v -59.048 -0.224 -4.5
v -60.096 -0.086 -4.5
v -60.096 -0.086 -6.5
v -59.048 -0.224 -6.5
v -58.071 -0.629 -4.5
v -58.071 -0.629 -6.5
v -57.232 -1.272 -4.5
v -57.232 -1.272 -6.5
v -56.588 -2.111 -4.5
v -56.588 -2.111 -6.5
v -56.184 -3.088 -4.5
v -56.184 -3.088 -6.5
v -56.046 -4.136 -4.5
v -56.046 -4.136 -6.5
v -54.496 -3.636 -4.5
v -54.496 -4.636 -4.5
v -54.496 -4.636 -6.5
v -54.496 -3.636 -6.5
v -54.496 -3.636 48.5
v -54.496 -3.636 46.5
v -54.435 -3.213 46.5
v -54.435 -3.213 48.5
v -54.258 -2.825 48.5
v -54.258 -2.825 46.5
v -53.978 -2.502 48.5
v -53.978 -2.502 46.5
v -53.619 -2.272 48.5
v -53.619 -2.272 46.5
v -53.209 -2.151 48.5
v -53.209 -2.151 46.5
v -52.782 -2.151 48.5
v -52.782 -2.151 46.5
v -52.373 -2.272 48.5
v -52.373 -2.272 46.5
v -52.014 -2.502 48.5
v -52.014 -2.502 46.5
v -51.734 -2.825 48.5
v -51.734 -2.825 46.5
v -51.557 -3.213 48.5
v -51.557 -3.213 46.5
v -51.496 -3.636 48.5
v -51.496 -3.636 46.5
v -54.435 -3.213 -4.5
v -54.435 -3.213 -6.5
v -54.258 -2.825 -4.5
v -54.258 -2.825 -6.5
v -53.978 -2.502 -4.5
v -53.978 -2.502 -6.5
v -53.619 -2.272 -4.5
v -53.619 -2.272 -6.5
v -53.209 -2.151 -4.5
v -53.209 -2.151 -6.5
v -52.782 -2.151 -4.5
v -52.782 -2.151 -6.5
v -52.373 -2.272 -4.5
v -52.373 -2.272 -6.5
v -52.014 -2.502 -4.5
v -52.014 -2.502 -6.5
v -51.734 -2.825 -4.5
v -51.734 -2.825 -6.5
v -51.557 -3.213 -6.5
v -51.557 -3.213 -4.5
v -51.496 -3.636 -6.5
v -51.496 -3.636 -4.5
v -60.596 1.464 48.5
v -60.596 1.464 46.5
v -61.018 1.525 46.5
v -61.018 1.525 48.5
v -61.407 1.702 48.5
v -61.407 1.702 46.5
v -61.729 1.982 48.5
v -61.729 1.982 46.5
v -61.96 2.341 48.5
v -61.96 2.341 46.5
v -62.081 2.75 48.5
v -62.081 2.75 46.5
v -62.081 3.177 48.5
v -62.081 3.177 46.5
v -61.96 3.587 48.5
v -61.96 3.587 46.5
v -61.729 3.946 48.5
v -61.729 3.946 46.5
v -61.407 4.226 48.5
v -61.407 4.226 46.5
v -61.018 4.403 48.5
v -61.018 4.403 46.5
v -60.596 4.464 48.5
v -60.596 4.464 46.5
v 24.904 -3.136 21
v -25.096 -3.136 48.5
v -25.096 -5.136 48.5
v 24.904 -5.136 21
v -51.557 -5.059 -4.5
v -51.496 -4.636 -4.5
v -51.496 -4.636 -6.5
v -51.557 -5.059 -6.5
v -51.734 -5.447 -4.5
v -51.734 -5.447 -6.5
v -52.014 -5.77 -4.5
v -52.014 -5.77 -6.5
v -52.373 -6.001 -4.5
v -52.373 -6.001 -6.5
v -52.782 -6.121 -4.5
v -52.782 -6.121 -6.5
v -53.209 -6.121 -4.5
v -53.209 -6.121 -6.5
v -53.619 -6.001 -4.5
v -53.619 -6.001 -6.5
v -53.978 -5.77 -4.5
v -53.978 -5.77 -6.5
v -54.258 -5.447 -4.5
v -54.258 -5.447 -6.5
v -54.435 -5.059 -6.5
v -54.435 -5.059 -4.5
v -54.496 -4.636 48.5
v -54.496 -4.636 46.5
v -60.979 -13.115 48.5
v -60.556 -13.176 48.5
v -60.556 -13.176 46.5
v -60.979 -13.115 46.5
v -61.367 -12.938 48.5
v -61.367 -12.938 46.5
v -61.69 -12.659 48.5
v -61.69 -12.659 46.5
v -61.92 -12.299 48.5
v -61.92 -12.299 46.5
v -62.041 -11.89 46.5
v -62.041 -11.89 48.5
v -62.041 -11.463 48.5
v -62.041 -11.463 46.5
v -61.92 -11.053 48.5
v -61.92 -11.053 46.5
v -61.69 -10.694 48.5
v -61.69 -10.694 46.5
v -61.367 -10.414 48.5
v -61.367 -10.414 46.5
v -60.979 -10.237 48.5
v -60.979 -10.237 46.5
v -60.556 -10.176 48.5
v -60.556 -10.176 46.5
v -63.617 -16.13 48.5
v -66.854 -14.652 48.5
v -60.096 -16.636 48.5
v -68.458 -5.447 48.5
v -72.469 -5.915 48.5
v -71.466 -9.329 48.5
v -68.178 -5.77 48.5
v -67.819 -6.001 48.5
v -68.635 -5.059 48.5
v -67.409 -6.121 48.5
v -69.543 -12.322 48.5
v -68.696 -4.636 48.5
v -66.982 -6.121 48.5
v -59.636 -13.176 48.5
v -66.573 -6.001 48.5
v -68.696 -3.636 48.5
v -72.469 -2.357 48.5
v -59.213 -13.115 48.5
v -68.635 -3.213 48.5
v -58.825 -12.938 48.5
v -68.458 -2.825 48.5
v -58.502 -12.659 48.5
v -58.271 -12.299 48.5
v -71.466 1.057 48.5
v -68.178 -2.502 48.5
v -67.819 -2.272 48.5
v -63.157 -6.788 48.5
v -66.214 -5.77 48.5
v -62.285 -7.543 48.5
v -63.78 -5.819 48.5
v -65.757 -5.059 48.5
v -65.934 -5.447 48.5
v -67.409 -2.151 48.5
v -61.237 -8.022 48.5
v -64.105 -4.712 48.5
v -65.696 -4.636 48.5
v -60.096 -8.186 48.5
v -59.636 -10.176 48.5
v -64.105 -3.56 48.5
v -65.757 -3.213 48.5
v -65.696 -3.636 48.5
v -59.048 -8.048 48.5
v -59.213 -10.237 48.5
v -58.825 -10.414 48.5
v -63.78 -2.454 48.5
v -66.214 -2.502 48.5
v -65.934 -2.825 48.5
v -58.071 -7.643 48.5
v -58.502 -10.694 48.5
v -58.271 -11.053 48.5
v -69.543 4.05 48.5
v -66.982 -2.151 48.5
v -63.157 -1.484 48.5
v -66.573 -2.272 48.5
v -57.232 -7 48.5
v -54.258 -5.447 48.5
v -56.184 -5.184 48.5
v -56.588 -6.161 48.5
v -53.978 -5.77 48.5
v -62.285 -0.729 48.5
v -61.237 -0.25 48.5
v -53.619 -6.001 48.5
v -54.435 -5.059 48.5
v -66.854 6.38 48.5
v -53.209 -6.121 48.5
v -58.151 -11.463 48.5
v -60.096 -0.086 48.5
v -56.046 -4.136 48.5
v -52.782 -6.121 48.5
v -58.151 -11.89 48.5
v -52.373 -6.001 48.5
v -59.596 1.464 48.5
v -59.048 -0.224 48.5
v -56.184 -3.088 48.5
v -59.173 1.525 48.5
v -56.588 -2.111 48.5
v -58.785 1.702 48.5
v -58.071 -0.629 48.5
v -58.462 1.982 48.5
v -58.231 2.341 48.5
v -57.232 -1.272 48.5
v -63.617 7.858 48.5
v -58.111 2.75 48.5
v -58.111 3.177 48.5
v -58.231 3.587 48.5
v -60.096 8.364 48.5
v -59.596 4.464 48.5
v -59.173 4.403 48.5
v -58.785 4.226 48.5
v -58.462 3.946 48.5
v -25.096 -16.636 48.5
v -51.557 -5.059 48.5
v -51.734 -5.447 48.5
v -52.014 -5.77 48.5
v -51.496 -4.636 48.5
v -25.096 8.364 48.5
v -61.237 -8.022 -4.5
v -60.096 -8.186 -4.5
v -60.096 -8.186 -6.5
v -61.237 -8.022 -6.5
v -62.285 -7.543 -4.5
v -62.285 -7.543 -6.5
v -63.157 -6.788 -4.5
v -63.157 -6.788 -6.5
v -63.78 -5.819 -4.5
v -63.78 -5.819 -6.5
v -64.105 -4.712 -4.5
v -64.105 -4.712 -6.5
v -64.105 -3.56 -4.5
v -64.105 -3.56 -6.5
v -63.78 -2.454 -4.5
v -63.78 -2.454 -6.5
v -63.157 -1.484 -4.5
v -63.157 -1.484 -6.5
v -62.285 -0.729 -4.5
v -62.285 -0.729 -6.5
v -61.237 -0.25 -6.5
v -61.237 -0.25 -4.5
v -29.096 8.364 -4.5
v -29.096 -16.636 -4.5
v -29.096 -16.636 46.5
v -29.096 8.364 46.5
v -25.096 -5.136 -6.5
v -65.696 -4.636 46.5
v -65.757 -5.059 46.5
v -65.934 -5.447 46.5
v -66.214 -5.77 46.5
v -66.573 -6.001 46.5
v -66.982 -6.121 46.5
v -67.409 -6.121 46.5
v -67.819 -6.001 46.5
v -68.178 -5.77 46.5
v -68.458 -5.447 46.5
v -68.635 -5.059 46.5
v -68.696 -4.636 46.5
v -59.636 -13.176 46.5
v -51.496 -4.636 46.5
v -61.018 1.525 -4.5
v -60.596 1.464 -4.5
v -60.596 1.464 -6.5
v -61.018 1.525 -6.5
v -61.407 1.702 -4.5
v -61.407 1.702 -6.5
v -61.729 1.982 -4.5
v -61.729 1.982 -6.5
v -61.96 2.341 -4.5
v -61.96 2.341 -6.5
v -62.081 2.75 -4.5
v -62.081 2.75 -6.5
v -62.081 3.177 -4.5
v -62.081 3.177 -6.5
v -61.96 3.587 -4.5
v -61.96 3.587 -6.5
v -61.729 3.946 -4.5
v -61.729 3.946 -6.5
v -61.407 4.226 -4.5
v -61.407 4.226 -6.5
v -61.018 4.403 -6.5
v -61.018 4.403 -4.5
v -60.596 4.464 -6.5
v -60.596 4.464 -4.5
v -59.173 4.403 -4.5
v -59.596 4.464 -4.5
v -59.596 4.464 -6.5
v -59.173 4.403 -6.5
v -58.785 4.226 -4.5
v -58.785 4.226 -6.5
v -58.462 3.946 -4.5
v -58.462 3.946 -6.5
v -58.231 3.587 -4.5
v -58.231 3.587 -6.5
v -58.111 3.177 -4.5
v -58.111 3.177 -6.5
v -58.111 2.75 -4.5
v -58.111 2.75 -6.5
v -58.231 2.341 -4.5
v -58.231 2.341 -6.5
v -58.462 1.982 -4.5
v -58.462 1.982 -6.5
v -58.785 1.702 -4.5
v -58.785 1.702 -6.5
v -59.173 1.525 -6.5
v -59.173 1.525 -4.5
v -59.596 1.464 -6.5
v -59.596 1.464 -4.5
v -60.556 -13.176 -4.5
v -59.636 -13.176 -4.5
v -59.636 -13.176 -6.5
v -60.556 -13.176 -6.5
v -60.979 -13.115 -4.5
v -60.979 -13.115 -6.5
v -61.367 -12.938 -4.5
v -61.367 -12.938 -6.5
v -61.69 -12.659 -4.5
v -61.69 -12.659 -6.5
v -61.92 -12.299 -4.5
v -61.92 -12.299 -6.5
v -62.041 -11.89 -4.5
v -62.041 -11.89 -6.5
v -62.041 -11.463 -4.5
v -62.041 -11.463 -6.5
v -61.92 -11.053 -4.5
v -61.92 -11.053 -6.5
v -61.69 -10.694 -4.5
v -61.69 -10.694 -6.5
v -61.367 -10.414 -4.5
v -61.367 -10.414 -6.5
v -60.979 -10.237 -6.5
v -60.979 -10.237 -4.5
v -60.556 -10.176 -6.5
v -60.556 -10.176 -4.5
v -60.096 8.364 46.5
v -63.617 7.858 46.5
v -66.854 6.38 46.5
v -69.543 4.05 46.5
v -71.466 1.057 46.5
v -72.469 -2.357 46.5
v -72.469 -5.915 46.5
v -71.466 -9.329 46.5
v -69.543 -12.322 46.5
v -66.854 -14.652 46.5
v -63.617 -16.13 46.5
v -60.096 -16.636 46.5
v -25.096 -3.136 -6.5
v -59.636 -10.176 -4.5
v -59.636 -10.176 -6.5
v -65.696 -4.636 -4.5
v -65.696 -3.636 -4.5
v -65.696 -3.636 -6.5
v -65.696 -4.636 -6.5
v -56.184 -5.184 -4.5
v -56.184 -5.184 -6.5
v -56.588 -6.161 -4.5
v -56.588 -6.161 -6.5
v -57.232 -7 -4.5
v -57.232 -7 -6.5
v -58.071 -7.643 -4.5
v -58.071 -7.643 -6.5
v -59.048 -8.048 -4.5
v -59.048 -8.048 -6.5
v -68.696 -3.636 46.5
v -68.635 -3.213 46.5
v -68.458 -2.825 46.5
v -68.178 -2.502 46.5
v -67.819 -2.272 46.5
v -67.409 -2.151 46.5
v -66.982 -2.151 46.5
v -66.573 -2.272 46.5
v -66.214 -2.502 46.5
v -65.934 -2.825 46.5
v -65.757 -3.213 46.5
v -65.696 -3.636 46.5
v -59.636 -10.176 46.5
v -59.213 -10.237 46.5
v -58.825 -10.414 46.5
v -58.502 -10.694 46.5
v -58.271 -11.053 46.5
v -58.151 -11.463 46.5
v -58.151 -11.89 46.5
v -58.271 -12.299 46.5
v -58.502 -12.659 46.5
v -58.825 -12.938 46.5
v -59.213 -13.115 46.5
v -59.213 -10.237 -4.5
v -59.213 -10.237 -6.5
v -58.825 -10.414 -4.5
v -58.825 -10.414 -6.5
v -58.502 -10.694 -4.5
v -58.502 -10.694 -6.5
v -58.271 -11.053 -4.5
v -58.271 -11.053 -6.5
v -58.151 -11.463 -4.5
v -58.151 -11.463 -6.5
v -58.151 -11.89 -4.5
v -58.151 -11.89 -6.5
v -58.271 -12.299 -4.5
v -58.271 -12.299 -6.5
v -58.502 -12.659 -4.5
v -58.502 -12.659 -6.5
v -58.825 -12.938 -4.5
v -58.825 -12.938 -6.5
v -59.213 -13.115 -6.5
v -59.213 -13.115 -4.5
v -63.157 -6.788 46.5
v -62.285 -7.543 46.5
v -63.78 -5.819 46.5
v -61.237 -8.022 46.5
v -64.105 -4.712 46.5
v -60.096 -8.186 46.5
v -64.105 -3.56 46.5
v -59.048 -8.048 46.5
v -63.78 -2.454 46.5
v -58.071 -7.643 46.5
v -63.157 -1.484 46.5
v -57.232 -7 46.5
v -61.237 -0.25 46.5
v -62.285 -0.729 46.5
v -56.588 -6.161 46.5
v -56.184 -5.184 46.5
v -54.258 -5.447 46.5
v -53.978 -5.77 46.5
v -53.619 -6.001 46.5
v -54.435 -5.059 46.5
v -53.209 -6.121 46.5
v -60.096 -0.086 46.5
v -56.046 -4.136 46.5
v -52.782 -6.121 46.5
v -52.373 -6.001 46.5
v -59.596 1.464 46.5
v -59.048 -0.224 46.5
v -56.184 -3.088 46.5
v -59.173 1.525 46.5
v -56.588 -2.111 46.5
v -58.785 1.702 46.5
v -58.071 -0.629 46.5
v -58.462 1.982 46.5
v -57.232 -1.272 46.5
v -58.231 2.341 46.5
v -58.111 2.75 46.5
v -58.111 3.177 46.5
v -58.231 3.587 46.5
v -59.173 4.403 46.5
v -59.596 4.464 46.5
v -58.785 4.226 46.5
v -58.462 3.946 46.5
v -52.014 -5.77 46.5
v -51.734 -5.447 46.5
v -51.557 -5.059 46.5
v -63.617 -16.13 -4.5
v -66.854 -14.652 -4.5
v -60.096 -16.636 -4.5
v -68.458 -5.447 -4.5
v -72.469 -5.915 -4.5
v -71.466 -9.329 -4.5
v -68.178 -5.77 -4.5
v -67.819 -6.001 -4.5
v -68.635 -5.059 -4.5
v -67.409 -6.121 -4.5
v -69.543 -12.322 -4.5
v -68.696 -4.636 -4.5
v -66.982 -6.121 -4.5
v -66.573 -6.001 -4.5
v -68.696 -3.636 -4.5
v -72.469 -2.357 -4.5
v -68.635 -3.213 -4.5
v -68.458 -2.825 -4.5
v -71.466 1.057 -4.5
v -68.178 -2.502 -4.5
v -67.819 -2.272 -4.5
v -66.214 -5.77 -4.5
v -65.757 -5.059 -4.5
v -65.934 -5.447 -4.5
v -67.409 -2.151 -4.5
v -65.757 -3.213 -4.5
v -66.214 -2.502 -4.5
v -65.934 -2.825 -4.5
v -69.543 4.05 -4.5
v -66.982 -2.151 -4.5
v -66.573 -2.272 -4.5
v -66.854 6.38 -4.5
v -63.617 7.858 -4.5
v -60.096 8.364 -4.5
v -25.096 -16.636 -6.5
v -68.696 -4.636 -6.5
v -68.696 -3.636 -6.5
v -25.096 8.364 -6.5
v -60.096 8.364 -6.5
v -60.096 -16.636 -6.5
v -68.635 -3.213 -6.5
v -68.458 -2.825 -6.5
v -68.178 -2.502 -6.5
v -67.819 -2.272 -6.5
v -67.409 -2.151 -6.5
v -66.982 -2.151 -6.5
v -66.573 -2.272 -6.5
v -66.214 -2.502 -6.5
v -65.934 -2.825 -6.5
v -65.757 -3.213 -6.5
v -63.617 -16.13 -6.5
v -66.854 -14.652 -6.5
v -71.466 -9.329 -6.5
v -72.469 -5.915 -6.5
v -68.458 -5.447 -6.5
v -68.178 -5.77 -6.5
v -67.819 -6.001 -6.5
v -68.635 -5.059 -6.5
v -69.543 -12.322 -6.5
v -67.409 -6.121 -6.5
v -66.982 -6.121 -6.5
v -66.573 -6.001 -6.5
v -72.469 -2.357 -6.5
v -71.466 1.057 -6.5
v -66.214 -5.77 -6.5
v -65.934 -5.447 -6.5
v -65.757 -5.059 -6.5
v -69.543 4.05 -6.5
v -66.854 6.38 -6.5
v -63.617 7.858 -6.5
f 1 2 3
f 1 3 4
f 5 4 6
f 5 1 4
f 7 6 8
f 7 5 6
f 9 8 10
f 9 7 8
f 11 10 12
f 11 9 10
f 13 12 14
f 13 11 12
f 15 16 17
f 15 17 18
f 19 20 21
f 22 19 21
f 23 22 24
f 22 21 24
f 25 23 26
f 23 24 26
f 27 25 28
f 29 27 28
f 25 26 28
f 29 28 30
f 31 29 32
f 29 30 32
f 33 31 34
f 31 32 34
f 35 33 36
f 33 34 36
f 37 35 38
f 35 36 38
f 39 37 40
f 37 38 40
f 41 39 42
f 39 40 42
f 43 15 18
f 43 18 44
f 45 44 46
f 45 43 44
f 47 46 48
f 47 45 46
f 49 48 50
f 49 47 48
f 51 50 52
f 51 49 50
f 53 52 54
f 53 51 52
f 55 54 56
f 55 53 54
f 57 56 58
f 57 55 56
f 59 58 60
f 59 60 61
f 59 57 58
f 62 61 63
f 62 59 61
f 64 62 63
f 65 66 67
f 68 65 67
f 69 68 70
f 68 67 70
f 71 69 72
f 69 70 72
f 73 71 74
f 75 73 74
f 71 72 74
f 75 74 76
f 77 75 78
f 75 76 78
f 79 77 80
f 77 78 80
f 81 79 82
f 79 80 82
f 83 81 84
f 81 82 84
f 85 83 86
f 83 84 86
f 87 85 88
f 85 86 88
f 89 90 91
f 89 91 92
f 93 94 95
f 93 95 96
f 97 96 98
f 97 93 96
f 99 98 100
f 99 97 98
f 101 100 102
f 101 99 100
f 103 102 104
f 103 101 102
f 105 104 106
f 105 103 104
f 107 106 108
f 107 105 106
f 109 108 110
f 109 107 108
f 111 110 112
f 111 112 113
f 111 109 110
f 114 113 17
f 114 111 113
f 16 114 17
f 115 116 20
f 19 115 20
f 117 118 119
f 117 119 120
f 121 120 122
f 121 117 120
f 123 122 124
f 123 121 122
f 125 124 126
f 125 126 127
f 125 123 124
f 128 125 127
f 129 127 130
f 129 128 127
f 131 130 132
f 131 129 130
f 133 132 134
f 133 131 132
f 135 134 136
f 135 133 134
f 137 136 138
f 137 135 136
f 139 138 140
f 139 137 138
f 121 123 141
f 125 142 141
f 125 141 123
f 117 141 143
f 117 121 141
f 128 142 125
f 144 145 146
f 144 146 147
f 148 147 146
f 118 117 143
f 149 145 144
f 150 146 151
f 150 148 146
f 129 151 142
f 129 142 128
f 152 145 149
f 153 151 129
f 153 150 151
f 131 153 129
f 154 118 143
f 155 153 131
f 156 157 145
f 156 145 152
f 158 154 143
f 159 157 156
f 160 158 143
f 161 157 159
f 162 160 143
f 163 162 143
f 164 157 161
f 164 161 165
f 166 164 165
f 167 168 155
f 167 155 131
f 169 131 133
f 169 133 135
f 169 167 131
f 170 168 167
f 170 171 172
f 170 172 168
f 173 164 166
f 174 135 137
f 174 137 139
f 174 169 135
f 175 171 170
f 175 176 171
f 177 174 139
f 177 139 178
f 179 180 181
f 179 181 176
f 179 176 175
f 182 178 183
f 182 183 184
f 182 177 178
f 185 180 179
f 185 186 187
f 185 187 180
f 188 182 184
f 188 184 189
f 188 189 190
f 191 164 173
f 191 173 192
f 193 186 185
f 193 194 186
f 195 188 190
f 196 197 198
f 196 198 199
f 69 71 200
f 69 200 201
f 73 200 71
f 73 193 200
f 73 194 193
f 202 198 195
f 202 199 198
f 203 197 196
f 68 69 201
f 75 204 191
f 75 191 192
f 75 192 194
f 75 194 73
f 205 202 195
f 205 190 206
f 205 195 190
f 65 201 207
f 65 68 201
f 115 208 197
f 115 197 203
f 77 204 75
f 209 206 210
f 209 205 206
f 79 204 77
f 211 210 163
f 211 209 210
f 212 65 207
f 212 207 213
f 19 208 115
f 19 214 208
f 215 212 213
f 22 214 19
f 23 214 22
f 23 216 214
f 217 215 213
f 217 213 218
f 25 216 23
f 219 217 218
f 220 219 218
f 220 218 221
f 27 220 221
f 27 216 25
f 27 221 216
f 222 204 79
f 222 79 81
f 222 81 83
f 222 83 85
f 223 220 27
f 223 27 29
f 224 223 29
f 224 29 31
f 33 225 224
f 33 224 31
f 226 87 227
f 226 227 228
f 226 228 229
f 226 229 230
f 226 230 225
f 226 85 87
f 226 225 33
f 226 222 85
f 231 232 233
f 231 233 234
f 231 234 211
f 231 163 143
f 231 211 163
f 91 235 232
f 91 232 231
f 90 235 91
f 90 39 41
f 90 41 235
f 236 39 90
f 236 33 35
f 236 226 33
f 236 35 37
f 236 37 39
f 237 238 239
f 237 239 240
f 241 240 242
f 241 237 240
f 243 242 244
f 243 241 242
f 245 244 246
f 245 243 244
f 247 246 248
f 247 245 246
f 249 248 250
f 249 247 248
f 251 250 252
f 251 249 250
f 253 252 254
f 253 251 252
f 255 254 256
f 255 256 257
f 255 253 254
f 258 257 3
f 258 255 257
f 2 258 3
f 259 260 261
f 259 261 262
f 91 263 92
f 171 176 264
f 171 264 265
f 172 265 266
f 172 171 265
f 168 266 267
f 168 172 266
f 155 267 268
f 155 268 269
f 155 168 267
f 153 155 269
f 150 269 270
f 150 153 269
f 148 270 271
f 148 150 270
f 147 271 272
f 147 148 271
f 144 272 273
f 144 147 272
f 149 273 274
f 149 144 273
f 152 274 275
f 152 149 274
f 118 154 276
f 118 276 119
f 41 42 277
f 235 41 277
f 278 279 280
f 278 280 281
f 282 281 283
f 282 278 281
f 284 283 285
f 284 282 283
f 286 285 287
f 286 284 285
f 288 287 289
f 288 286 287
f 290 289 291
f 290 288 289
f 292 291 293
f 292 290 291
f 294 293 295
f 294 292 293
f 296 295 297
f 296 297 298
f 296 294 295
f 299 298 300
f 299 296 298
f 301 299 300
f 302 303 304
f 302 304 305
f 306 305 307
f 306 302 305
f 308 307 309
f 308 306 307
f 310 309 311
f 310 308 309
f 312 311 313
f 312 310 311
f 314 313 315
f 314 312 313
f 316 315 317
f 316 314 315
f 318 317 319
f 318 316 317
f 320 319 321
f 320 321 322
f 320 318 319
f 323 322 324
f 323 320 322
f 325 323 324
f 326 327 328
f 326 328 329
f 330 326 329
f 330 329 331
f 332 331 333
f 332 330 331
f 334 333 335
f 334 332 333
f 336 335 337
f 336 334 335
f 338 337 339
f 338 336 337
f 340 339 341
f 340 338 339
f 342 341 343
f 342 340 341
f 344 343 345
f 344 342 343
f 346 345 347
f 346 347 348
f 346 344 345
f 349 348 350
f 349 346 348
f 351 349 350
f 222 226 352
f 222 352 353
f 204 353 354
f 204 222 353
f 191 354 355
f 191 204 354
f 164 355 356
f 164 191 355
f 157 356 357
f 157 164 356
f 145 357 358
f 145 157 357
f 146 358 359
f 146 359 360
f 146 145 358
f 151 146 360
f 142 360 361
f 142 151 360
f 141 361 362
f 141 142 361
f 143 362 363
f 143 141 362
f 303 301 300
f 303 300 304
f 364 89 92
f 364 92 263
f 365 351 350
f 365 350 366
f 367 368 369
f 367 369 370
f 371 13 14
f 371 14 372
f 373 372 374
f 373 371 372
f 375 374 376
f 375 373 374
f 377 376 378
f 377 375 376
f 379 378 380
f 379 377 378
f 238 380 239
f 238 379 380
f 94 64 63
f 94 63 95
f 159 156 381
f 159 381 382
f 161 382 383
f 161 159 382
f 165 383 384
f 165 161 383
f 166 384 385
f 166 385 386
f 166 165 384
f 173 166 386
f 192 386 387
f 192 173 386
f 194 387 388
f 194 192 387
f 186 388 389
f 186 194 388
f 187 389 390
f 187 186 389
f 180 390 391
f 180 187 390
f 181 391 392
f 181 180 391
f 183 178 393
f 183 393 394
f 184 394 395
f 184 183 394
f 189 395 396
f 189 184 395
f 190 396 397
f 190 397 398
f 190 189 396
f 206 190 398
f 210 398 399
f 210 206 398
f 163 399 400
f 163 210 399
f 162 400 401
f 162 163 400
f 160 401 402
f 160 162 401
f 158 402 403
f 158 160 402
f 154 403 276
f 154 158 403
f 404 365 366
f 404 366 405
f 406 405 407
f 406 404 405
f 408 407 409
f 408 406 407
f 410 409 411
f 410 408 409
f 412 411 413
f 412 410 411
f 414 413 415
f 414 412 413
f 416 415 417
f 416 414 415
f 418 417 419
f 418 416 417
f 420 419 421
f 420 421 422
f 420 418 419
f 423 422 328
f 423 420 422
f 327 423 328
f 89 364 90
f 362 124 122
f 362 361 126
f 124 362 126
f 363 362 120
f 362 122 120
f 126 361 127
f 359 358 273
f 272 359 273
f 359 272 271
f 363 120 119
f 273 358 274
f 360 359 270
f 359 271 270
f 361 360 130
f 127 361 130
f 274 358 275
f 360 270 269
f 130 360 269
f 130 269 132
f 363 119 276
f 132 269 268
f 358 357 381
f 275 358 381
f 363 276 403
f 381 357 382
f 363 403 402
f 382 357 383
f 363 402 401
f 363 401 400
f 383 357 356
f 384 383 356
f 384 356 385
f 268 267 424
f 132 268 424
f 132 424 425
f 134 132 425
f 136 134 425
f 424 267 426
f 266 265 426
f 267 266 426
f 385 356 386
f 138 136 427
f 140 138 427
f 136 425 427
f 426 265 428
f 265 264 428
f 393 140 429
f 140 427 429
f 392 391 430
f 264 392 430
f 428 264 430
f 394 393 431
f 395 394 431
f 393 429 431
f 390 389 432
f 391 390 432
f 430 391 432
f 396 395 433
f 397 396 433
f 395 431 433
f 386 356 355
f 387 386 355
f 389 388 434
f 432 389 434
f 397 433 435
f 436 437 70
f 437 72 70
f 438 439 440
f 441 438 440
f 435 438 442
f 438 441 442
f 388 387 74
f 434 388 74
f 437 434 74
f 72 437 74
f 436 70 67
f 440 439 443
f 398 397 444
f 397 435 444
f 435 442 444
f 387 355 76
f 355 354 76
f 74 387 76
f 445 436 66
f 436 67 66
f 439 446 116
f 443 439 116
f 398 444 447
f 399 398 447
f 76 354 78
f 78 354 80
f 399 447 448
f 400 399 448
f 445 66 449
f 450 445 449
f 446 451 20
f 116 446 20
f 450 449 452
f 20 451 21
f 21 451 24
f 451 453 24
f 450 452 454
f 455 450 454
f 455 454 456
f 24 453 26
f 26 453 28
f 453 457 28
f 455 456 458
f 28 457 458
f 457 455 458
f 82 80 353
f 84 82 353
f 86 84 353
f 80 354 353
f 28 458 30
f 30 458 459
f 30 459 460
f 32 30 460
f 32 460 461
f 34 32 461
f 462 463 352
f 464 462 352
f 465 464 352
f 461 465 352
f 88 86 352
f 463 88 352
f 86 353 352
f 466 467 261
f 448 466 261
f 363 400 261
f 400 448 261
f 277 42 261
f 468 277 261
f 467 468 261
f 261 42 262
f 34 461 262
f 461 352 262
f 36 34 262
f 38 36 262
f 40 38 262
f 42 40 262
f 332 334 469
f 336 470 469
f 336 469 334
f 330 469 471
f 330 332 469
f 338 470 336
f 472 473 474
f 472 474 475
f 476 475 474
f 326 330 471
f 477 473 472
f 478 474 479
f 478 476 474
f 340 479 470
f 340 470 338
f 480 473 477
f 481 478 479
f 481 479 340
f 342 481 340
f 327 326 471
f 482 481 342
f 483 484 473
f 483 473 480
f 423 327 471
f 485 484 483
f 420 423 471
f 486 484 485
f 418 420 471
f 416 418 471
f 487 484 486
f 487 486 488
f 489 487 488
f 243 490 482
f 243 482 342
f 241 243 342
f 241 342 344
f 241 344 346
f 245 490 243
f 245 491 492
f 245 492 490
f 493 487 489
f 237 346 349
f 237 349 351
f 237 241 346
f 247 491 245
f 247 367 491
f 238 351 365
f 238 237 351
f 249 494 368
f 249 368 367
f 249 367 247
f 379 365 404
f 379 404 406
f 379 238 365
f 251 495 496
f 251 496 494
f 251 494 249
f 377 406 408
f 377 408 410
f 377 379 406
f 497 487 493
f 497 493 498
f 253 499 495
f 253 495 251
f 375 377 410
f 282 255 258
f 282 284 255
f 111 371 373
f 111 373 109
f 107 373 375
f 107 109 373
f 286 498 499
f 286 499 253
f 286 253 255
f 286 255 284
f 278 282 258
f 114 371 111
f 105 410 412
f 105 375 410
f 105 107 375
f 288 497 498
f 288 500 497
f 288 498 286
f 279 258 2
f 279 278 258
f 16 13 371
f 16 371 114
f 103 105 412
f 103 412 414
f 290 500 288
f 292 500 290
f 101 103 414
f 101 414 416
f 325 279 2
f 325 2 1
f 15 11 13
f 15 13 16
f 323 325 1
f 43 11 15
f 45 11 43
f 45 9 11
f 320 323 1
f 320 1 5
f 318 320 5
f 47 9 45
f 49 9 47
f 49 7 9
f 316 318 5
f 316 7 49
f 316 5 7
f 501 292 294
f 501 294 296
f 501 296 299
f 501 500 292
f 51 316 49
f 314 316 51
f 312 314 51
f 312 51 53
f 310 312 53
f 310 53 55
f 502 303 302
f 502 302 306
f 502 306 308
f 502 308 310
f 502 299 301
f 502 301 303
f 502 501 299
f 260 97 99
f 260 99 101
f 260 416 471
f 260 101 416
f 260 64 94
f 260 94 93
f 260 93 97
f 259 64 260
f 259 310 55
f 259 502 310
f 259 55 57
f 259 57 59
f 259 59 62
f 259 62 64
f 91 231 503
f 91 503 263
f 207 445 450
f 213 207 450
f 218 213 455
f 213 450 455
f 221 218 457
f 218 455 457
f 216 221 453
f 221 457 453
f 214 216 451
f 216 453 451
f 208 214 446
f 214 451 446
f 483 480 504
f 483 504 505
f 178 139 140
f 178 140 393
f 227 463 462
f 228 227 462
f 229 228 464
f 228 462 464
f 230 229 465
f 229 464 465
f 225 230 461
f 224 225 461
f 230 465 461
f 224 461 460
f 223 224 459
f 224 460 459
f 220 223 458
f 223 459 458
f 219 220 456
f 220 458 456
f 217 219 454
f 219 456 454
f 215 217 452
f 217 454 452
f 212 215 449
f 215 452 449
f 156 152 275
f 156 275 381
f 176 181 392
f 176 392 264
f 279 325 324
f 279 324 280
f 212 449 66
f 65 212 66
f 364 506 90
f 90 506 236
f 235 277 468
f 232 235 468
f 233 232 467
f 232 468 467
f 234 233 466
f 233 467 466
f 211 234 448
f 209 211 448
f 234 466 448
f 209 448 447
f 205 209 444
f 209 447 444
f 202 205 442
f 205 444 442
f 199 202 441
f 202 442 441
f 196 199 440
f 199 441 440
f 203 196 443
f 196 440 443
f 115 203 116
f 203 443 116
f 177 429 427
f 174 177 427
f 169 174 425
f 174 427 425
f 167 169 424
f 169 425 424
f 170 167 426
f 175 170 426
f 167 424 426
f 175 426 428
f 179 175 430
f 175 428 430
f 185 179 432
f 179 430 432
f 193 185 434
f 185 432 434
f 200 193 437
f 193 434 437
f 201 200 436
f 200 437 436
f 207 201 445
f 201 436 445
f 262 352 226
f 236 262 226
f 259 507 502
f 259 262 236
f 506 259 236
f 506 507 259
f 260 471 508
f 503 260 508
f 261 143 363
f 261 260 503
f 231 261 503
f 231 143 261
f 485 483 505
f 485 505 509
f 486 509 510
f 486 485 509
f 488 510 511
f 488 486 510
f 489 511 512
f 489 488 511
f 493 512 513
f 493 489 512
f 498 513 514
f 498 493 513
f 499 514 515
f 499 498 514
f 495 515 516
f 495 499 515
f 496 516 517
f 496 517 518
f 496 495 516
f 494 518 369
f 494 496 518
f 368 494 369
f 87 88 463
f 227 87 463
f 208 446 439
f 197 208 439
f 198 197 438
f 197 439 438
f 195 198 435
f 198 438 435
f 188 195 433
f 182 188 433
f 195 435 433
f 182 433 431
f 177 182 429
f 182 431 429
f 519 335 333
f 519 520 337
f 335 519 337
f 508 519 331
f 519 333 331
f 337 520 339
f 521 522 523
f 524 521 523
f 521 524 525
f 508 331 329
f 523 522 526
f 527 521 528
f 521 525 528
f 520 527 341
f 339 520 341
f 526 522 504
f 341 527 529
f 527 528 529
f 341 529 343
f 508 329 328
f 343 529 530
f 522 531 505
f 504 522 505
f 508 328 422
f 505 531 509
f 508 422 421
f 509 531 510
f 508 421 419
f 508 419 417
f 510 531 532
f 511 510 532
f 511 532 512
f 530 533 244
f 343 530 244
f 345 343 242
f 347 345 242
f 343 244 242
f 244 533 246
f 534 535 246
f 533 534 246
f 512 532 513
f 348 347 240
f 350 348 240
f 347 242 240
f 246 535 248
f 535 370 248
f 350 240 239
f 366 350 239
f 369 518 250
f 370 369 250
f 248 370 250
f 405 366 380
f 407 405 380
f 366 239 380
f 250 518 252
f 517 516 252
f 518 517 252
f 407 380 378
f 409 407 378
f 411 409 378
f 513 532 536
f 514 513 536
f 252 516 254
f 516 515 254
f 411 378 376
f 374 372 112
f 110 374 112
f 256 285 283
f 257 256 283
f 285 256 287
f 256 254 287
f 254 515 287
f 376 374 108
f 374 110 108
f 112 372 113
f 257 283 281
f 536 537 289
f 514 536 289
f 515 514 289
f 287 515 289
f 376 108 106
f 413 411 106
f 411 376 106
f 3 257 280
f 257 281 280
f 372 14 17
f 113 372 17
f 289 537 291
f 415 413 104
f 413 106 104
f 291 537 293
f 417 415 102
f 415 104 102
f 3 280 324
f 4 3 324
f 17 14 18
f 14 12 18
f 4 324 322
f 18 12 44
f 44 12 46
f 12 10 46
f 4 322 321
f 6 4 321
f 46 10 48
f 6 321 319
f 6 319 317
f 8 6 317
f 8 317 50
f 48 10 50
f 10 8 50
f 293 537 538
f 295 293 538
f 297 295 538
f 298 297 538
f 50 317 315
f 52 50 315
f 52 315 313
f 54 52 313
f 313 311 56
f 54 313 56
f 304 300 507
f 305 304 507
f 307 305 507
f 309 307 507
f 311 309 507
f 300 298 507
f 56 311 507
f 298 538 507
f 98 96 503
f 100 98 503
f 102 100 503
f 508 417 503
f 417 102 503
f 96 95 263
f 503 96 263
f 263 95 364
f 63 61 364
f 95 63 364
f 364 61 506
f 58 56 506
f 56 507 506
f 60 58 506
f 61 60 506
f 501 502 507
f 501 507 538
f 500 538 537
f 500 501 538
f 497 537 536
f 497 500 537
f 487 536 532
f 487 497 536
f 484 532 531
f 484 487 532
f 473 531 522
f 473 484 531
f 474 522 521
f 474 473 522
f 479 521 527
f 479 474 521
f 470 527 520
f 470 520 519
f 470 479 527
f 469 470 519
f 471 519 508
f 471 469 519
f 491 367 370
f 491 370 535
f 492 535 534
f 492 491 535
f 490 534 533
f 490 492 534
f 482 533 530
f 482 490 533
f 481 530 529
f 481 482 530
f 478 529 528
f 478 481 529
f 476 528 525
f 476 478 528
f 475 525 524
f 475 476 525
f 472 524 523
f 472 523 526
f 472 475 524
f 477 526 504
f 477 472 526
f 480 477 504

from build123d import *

# Parameters (mm, degrees)
SKETCH1_W           = 62
SKETCH1_H           = 42
SKETCH1_W_2         = 41
SKETCH1_H_2         = 21
BOSS_EXTRUDE1_DEPTH = 42
SKETCH2_W           = 4
SKETCH2_H           = 25
BOSS_EXTRUDE2_DEPTH = 4.5
SKETCH2_2_W         = 4
SKETCH2_2_H         = 25
BOSS_EXTRUDE3_DEPTH = 45.55
SKETCH3_R           = 4.05
BOSS_EXTRUDE6_DEPTH = 2
BOSS_EXTRUDE7_START = -53
SKETCH3_8_R         = 4.05
BOSS_EXTRUDE7_DEPTH = 53
CUT_EXTRUDE1_START  = -51
SKETCH3_11_R        = 4.05
CUT_EXTRUDE1_DEPTH  = 51
SKETCH_1_W          = 8.5
SKETCH_1_H          = 5.5
CUT_EXTRUDE_1_DEPTH = 40
CUT_EXTRUDE_3_DEPTH = 42
EXTRUDE_1_DEPTH     = 13.5
CUT_EXTRUDE_4_DEPTH = 11.5


with BuildPart() as part:
    # Sketch1 → Boss-Extrude1 (new body)
    with BuildSketch(Plane.XY):
        with Locations((1.904162196, -4.136072895)):
            Rectangle(SKETCH1_W, SKETCH1_H)
        with Locations((1.904162196, -4.136072895)):
            Rectangle(SKETCH1_W_2, SKETCH1_H_2, mode=Mode.SUBTRACT)
    extrude(amount=BOSS_EXTRUDE1_DEPTH)

    # Sketch2 → Boss-Extrude2 (add)
    with BuildSketch(Plane.XY.offset(42)):
        with Locations((-27.095837804, -4.136072895)):
            Rectangle(SKETCH2_W, SKETCH2_H)
    extrude(amount=BOSS_EXTRUDE2_DEPTH)

    # Sketch2<2> → Boss-Extrude3 (add)
    with BuildSketch(Plane.XY.offset(42)):
        with Locations((-27.095837804, -4.136072895)):
            Rectangle(SKETCH2_2_W, SKETCH2_2_H)
    extrude(amount=-BOSS_EXTRUDE3_DEPTH)

    # Sketch3 → Boss-Extrude6 (add)
    with BuildSketch(Plane.XY.offset(46.5)):
        with BuildLine():
            Line((-25.095837804, -16.636072895), (-25.095837804, 8.363927105))
            Line((-25.095837804, 8.363927105), (-60.095837804, 8.363927105))
            ThreePointArc((-60.095837804, 8.363927105), (-72.595837804, -4.136072895), (-60.095837804, -16.636072895))
            Line((-60.095837804, -16.636072895), (-25.095837804, -16.636072895))
        make_face()
        with BuildLine():
            Line((-51.495837804, -3.636072895), (-51.495837804, -4.636072895))
            ThreePointArc((-51.495837804, -4.636072895), (-52.995837804, -6.136072895), (-54.495837804, -4.636072895))
            Line((-54.495837804, -4.636072895), (-54.495837804, -3.636072895))
            ThreePointArc((-54.495837804, -3.636072895), (-52.995837804, -2.136072895), (-51.495837804, -3.636072895))
        make_face(mode=Mode.SUBTRACT)
        with BuildLine():
            Line((-59.635749439, -13.176248856), (-60.555926168, -13.176248856))
            ThreePointArc((-60.555926168, -13.176248856), (-62.055926168, -11.676248856), (-60.555926168, -10.176248856))
            Line((-60.555926168, -10.176248856), (-59.635749439, -10.176248856))
            ThreePointArc((-59.635749439, -10.176248856), (-58.135749439, -11.676248856), (-59.635749439, -13.176248856))
        make_face(mode=Mode.SUBTRACT)
        with Locations((-60.095837804, -4.136072895)):
            Circle(SKETCH3_R, mode=Mode.SUBTRACT)
        with BuildLine():
            Line((-59.595837804, 1.463927105), (-60.595837804, 1.463927105))
            ThreePointArc((-60.595837804, 1.463927105), (-62.095837804, 2.963927105), (-60.595837804, 4.463927105))
            Line((-60.595837804, 4.463927105), (-59.595837804, 4.463927105))
            ThreePointArc((-59.595837804, 4.463927105), (-58.095837804, 2.963927105), (-59.595837804, 1.463927105))
        make_face(mode=Mode.SUBTRACT)
        with BuildLine():
            ThreePointArc((-68.695837804, -3.636072895), (-67.195837804, -2.136072895), (-65.695837804, -3.636072895))
            Line((-65.695837804, -3.636072895), (-65.695837804, -4.636072895))
            ThreePointArc((-65.695837804, -4.636072895), (-67.195837804, -6.136072895), (-68.695837804, -4.636072895))
            Line((-68.695837804, -4.636072895), (-68.695837804, -3.636072895))
        make_face(mode=Mode.SUBTRACT)
    extrude(amount=BOSS_EXTRUDE6_DEPTH)

    # Sketch3<8> → Boss-Extrude7 (add)
    with BuildSketch(Plane.XY.offset(46.5).offset(BOSS_EXTRUDE7_START)):
        with BuildLine():
            Line((-25.095837804, -16.636072895), (-25.095837804, 8.363927105))
            Line((-25.095837804, 8.363927105), (-60.095837804, 8.363927105))
            ThreePointArc((-60.095837804, 8.363927105), (-72.595837804, -4.136072895), (-60.095837804, -16.636072895))
            Line((-60.095837804, -16.636072895), (-25.095837804, -16.636072895))
        make_face()
        with BuildLine():
            Line((-51.495837804, -3.636072895), (-51.495837804, -4.636072895))
            ThreePointArc((-51.495837804, -4.636072895), (-52.995837804, -6.136072895), (-54.495837804, -4.636072895))
            Line((-54.495837804, -4.636072895), (-54.495837804, -3.636072895))
            ThreePointArc((-54.495837804, -3.636072895), (-52.995837804, -2.136072895), (-51.495837804, -3.636072895))
        make_face(mode=Mode.SUBTRACT)
        with BuildLine():
            Line((-59.635749439, -13.176248856), (-60.555926168, -13.176248856))
            ThreePointArc((-60.555926168, -13.176248856), (-62.055926168, -11.676248856), (-60.555926168, -10.176248856))
            Line((-60.555926168, -10.176248856), (-59.635749439, -10.176248856))
            ThreePointArc((-59.635749439, -10.176248856), (-58.135749439, -11.676248856), (-59.635749439, -13.176248856))
        make_face(mode=Mode.SUBTRACT)
        with Locations((-60.095837804, -4.136072895)):
            Circle(SKETCH3_8_R, mode=Mode.SUBTRACT)
        with BuildLine():
            Line((-59.595837804, 1.463927105), (-60.595837804, 1.463927105))
            ThreePointArc((-60.595837804, 1.463927105), (-62.095837804, 2.963927105), (-60.595837804, 4.463927105))
            Line((-60.595837804, 4.463927105), (-59.595837804, 4.463927105))
            ThreePointArc((-59.595837804, 4.463927105), (-58.095837804, 2.963927105), (-59.595837804, 1.463927105))
        make_face(mode=Mode.SUBTRACT)
        with BuildLine():
            ThreePointArc((-68.695837804, -3.636072895), (-67.195837804, -2.136072895), (-65.695837804, -3.636072895))
            Line((-65.695837804, -3.636072895), (-65.695837804, -4.636072895))
            ThreePointArc((-65.695837804, -4.636072895), (-67.195837804, -6.136072895), (-68.695837804, -4.636072895))
            Line((-68.695837804, -4.636072895), (-68.695837804, -3.636072895))
        make_face(mode=Mode.SUBTRACT)
    extrude(amount=BOSS_EXTRUDE7_DEPTH)

    # Sketch3<11> → Cut-Extrude1 (cut)
    with BuildSketch(Plane.XY.offset(46.5).offset(CUT_EXTRUDE1_START)):
        with BuildLine():
            Line((-29.095837804, -16.636072895), (-29.095837804, 8.363927105))
            Line((-29.095837804, 8.363927105), (-60.095837804, 8.363927105))
            ThreePointArc((-60.095837804, 8.363927105), (-72.595837804, -4.136072895), (-60.095837804, -16.636072895))
            Line((-60.095837804, -16.636072895), (-29.095837804, -16.636072895))
        make_face()
        with BuildLine():
            Line((-59.635749439, -13.176248856), (-60.555926168, -13.176248856))
            ThreePointArc((-60.555926168, -13.176248856), (-62.055926168, -11.676248856), (-60.555926168, -10.176248856))
            Line((-60.555926168, -10.176248856), (-59.635749439, -10.176248856))
            ThreePointArc((-59.635749439, -10.176248856), (-58.135749439, -11.676248856), (-59.635749439, -13.176248856))
        make_face(mode=Mode.SUBTRACT)
        with Locations((-60.095837804, -4.136072895)):
            Circle(SKETCH3_11_R, mode=Mode.SUBTRACT)
        with BuildLine():
            Line((-59.595837804, 1.463927105), (-60.595837804, 1.463927105))
            ThreePointArc((-60.595837804, 1.463927105), (-62.095837804, 2.963927105), (-60.595837804, 4.463927105))
            Line((-60.595837804, 4.463927105), (-59.595837804, 4.463927105))
            ThreePointArc((-59.595837804, 4.463927105), (-58.095837804, 2.963927105), (-59.595837804, 1.463927105))
        make_face(mode=Mode.SUBTRACT)
        with BuildLine():
            ThreePointArc((-54.495837804, -3.636072895), (-52.995837804, -2.136072895), (-51.495837804, -3.636072895))
            Line((-51.495837804, -3.636072895), (-51.495837804, -4.636072895))
            ThreePointArc((-51.495837804, -4.636072895), (-52.995837804, -6.136072895), (-54.495837804, -4.636072895))
            Line((-54.495837804, -4.636072895), (-54.495837804, -3.636072895))
        make_face(mode=Mode.SUBTRACT)
        with BuildLine():
            ThreePointArc((-68.695837804, -3.636072895), (-67.195837804, -2.136072895), (-65.695837804, -3.636072895))
            Line((-65.695837804, -3.636072895), (-65.695837804, -4.636072895))
            ThreePointArc((-65.695837804, -4.636072895), (-67.195837804, -6.136072895), (-68.695837804, -4.636072895))
            Line((-68.695837804, -4.636072895), (-68.695837804, -3.636072895))
        make_face(mode=Mode.SUBTRACT)
    extrude(amount=CUT_EXTRUDE1_DEPTH, mode=Mode.SUBTRACT)

    # 草圖1 → 除料-伸長1 (cut)
    with BuildSketch(Plane(origin=(0, 16.863927105, 0), x_dir=(1, 0, 0), z_dir=(0, 1, 0))):
        with Locations((8.454162196, -32.5)):
            Rectangle(SKETCH_1_W, SKETCH_1_H)
    extrude(amount=-CUT_EXTRUDE_1_DEPTH, mode=Mode.SUBTRACT)

    # 草圖3 → 除料-伸長3 (cut)
    with BuildSketch(Plane(origin=(0, 0, 0), x_dir=(-1, 0, 0), z_dir=(0, 0, -1))):
        Polygon((29.095837804, 8.363927105), (29.095837804, 16.863927105), (-32.904162196, 16.863927105), (-32.904162196, -25.136072895), (29.095837804, -25.136072895), (29.095837804, -16.636072895), (25.095837804, -16.636072895), (25.095837804, 8.363927105), align=None)
    extrude(amount=-CUT_EXTRUDE_3_DEPTH, mode=Mode.SUBTRACT)

    # 草圖5 → 填料-伸長1 (add)
    with BuildSketch(Plane(origin=(0, 8.363927105, 0), x_dir=(1, 0, 0), z_dir=(0, 1, 0))):
        Polygon((-25.095837804, 6.5), (-25.095837804, -48.5), (24.904162196, -21), align=None)
    extrude(amount=-EXTRUDE_1_DEPTH)

    # 草圖5<2> → 除料-伸長4 (cut)
    with BuildSketch(Plane(origin=(0, 8.363927105, 0), x_dir=(1, 0, 0), z_dir=(0, 1, 0))):
        Polygon((-25.095837804, 6.5), (-25.095837804, -48.5), (24.904162196, -21), align=None)
    extrude(amount=-CUT_EXTRUDE_4_DEPTH, mode=Mode.SUBTRACT)


solid = part.part
